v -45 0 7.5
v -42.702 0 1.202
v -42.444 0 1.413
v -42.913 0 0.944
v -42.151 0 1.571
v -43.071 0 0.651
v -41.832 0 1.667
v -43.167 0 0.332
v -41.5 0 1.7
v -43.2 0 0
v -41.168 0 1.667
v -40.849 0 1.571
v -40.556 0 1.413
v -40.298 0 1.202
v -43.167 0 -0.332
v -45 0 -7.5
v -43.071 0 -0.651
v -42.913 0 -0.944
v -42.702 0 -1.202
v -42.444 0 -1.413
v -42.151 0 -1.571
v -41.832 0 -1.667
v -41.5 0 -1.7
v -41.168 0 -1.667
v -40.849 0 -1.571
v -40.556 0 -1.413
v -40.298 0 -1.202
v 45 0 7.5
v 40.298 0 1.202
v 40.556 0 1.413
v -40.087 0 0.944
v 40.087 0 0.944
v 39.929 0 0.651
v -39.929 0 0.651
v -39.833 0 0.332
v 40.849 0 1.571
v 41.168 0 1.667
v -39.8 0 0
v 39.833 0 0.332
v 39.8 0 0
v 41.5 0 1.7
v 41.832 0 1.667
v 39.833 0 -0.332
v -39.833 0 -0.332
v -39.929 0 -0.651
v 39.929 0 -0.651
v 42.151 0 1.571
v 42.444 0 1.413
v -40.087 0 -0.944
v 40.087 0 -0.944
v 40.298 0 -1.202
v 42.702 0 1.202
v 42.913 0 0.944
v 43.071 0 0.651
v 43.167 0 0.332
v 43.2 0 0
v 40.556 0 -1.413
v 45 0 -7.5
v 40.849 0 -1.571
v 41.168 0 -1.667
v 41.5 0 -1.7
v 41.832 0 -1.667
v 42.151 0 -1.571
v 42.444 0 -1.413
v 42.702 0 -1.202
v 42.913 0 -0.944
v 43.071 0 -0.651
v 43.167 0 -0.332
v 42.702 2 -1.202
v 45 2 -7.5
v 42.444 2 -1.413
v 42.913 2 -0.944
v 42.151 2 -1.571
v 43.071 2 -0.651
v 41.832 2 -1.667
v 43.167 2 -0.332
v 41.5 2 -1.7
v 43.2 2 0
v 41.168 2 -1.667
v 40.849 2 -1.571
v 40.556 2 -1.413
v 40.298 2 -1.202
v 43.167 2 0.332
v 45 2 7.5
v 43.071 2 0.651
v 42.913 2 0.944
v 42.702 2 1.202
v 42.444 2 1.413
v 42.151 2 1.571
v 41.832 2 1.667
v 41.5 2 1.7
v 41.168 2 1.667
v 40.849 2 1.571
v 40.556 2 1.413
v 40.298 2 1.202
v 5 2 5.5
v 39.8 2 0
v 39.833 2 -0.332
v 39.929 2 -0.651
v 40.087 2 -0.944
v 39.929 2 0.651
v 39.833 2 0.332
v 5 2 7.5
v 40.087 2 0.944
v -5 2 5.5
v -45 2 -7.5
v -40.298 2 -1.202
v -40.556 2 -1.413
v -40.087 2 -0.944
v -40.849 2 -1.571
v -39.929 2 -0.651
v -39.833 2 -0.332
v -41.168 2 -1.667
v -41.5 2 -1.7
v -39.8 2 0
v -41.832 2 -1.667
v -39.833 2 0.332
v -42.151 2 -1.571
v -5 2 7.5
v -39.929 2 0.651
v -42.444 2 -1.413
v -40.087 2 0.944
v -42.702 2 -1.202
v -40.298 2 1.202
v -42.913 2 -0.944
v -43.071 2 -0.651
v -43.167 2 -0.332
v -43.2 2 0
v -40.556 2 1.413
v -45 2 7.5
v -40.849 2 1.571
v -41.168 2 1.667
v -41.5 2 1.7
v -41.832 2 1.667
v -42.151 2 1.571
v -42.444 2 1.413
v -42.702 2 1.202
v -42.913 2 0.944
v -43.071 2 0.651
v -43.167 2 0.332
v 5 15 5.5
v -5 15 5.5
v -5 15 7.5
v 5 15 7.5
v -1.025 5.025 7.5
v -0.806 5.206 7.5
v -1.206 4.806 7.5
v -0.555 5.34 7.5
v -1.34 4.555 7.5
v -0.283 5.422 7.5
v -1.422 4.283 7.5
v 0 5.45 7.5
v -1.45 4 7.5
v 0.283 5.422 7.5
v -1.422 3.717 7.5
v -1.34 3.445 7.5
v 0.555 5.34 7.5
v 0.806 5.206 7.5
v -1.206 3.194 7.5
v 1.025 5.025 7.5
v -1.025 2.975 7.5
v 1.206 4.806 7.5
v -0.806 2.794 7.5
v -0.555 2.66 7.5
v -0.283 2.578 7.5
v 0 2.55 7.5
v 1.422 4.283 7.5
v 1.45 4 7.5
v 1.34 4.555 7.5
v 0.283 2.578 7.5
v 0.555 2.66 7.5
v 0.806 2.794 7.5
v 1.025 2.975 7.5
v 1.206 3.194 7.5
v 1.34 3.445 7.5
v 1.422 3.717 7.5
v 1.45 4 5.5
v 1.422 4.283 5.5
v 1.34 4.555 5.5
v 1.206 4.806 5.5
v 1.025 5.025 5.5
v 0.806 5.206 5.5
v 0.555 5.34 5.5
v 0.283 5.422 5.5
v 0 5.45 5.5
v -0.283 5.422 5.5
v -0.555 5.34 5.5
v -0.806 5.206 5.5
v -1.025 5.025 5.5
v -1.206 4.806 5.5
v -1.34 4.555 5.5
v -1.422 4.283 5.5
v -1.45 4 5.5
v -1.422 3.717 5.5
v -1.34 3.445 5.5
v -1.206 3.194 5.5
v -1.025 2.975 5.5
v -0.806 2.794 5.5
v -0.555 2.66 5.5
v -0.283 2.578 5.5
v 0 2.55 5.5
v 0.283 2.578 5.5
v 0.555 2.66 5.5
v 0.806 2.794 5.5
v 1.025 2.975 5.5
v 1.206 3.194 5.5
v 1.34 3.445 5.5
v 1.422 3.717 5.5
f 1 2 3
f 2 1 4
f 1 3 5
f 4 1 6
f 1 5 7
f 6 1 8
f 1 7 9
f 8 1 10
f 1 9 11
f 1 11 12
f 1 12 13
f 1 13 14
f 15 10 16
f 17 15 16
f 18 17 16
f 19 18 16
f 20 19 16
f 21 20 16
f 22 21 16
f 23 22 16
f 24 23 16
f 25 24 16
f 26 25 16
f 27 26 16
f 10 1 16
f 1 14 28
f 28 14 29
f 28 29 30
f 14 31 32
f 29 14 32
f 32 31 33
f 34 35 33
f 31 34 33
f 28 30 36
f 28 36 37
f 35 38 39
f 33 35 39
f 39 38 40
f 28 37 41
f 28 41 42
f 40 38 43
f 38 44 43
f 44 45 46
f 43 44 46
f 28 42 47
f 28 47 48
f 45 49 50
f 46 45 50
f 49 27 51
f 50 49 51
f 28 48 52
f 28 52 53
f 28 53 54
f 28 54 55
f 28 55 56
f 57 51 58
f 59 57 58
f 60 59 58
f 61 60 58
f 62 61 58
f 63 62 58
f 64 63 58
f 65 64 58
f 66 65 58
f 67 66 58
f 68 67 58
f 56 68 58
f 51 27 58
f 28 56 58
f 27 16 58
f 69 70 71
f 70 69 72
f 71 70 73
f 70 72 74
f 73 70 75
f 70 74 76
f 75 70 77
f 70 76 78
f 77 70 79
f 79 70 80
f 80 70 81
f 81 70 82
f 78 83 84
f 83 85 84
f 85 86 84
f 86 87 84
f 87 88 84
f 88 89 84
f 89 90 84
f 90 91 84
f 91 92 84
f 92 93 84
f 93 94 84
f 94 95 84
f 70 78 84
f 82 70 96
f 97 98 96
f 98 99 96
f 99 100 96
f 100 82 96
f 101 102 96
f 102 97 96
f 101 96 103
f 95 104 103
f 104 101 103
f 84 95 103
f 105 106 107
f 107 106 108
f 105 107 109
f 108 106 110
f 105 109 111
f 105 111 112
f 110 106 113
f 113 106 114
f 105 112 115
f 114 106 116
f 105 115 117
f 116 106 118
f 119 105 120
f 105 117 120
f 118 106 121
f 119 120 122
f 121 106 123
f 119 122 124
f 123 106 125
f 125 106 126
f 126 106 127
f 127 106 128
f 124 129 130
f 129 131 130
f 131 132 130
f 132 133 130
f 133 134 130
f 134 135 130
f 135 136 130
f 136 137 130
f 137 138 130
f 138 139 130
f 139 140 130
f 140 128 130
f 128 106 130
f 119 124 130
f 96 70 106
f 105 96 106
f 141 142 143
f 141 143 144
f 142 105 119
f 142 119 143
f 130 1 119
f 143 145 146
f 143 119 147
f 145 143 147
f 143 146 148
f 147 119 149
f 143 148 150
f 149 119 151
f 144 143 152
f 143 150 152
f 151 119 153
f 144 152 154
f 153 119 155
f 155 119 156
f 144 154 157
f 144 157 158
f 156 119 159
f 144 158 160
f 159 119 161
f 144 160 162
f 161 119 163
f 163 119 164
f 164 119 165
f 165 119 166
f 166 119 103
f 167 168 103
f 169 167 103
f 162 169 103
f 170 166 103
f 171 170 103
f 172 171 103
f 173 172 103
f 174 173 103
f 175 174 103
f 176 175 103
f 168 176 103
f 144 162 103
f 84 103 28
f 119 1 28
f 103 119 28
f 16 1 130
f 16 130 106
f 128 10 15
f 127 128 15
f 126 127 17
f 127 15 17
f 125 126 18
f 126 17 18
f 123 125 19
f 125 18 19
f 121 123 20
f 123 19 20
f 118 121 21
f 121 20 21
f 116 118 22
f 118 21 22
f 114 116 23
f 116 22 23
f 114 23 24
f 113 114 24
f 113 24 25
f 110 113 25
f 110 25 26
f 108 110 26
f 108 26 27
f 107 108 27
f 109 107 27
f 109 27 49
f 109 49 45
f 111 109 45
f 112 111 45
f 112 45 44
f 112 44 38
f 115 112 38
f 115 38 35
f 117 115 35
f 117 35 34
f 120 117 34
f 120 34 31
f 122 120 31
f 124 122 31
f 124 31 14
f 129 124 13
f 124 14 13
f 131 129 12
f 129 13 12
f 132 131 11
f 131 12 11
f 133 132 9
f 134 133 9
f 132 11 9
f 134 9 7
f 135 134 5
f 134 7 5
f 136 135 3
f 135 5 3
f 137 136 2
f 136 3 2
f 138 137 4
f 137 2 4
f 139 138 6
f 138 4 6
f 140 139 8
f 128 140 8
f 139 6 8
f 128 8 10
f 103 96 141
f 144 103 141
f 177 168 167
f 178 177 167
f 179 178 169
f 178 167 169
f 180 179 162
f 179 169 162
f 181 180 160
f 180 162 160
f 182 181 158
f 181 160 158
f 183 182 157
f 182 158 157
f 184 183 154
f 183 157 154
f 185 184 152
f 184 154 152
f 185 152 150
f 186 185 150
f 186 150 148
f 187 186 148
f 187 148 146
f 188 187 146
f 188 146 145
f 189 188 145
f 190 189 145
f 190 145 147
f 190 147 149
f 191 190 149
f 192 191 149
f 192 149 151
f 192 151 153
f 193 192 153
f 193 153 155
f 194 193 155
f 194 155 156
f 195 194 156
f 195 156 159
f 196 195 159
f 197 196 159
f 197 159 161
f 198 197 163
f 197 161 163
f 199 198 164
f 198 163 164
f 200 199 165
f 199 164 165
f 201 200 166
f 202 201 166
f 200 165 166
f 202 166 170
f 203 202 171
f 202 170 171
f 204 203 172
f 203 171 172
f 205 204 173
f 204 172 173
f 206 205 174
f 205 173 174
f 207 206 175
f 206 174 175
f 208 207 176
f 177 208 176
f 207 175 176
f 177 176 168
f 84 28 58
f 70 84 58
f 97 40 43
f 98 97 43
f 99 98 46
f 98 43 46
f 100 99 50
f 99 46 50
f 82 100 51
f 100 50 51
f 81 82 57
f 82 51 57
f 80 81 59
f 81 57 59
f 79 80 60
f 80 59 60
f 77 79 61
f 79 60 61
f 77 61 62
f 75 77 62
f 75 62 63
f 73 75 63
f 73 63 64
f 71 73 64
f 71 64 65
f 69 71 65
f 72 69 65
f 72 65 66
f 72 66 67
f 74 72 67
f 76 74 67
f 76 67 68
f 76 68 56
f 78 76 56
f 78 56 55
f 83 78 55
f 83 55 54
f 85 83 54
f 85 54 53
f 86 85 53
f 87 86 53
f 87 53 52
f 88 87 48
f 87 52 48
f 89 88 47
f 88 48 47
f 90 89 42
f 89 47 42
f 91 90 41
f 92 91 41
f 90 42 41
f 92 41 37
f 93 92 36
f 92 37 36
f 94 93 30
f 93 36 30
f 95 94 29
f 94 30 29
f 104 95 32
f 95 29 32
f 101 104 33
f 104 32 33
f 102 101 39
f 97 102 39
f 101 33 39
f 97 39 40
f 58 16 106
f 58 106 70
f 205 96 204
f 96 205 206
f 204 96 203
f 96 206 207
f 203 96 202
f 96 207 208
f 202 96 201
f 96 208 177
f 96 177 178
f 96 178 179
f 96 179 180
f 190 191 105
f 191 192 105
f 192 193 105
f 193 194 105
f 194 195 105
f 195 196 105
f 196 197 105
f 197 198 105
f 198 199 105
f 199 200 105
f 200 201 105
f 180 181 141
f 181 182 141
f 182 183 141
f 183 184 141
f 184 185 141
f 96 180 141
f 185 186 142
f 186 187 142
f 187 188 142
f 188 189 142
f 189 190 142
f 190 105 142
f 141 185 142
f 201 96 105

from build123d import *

# Parameters (mm, degrees)
ESQUISSE1_W             = 90
ESQUISSE1_H             = 15
BOSS_EXTRU_1_DEPTH      = 15
ESQUISSE2_W             = 13
ESQUISSE2_H             = 13
ENL_V_MAT_EXTRU_1_DEPTH = 92.549167118
D_GAGEMENT_M31_D        = 3.4
D_GAGEMENT_M31_DEPTH    = 24
D_GAGEMENT_M31_TIP      = 1.021463052
ESQUISSE5_W             = 40
ESQUISSE5_H             = 13
ENL_V_MAT_EXTRU_2_DEPTH = 50.183330509
D_GAGEMENT_M2_51_D      = 2.9
D_GAGEMENT_M2_51_DEPTH  = 24
D_GAGEMENT_M2_51_TIP    = 0.871247898


with BuildPart() as part:
    # Esquisse1 → Boss.-Extru.1 (new body)
    with BuildSketch(Plane(origin=(0, 0, 0), x_dir=(1, 0, 0), z_dir=(0, 1, 0))):
        Rectangle(ESQUISSE1_W, ESQUISSE1_H)
    extrude(amount=BOSS_EXTRU_1_DEPTH)

    # Esquisse2 → Enlèv. mat.-Extru.1 (cut, through all)
    with BuildSketch(Plane.ZY.offset(45)):
        with Locations((-1, 8.5)):
            Rectangle(ESQUISSE2_W, ESQUISSE2_H)
    extrude(amount=-ENL_V_MAT_EXTRU_1_DEPTH, mode=Mode.SUBTRACT)

    # Dégagement M31
    with Locations(Plane(origin=(0, 2, 0), x_dir=(1, 0, 0), z_dir=(0, 1, 0))):
        with Locations((-41.5, 0), (41.5, 0)):
            Hole(D_GAGEMENT_M31_D / 2, depth=D_GAGEMENT_M31_DEPTH)
            with Locations((0, 0, -(D_GAGEMENT_M31_DEPTH + D_GAGEMENT_M31_TIP / 2))):  # 118° drill point
                Cone(0, D_GAGEMENT_M31_D / 2, D_GAGEMENT_M31_TIP, mode=Mode.SUBTRACT)

    # Esquisse5 → Enlèv. mat.-Extru.2 (cut, through all)
    with BuildSketch(Plane(origin=(0, 0, 5.5), x_dir=(-1, 0, 0), z_dir=(0, 0, -1))):
        with Locations((25, 8.5)):
            Rectangle(ESQUISSE5_W, ESQUISSE5_H)
        with Locations((-25, 8.5)):
            Rectangle(ESQUISSE5_W, ESQUISSE5_H)
    extrude(amount=-ENL_V_MAT_EXTRU_2_DEPTH, mode=Mode.SUBTRACT)

    # Dégagement M2.51
    with Locations(Plane(origin=(0, 0, 5.5), x_dir=(-1, 0, 0), z_dir=(0, 0, -1))):
        with Locations((0, 4)):
            Hole(D_GAGEMENT_M2_51_D / 2, depth=D_GAGEMENT_M2_51_DEPTH)
            with Locations((0, 0, -(D_GAGEMENT_M2_51_DEPTH + D_GAGEMENT_M2_51_TIP / 2))):  # 118° drill point
                Cone(0, D_GAGEMENT_M2_51_D / 2, D_GAGEMENT_M2_51_TIP, mode=Mode.SUBTRACT)


solid = part.part
